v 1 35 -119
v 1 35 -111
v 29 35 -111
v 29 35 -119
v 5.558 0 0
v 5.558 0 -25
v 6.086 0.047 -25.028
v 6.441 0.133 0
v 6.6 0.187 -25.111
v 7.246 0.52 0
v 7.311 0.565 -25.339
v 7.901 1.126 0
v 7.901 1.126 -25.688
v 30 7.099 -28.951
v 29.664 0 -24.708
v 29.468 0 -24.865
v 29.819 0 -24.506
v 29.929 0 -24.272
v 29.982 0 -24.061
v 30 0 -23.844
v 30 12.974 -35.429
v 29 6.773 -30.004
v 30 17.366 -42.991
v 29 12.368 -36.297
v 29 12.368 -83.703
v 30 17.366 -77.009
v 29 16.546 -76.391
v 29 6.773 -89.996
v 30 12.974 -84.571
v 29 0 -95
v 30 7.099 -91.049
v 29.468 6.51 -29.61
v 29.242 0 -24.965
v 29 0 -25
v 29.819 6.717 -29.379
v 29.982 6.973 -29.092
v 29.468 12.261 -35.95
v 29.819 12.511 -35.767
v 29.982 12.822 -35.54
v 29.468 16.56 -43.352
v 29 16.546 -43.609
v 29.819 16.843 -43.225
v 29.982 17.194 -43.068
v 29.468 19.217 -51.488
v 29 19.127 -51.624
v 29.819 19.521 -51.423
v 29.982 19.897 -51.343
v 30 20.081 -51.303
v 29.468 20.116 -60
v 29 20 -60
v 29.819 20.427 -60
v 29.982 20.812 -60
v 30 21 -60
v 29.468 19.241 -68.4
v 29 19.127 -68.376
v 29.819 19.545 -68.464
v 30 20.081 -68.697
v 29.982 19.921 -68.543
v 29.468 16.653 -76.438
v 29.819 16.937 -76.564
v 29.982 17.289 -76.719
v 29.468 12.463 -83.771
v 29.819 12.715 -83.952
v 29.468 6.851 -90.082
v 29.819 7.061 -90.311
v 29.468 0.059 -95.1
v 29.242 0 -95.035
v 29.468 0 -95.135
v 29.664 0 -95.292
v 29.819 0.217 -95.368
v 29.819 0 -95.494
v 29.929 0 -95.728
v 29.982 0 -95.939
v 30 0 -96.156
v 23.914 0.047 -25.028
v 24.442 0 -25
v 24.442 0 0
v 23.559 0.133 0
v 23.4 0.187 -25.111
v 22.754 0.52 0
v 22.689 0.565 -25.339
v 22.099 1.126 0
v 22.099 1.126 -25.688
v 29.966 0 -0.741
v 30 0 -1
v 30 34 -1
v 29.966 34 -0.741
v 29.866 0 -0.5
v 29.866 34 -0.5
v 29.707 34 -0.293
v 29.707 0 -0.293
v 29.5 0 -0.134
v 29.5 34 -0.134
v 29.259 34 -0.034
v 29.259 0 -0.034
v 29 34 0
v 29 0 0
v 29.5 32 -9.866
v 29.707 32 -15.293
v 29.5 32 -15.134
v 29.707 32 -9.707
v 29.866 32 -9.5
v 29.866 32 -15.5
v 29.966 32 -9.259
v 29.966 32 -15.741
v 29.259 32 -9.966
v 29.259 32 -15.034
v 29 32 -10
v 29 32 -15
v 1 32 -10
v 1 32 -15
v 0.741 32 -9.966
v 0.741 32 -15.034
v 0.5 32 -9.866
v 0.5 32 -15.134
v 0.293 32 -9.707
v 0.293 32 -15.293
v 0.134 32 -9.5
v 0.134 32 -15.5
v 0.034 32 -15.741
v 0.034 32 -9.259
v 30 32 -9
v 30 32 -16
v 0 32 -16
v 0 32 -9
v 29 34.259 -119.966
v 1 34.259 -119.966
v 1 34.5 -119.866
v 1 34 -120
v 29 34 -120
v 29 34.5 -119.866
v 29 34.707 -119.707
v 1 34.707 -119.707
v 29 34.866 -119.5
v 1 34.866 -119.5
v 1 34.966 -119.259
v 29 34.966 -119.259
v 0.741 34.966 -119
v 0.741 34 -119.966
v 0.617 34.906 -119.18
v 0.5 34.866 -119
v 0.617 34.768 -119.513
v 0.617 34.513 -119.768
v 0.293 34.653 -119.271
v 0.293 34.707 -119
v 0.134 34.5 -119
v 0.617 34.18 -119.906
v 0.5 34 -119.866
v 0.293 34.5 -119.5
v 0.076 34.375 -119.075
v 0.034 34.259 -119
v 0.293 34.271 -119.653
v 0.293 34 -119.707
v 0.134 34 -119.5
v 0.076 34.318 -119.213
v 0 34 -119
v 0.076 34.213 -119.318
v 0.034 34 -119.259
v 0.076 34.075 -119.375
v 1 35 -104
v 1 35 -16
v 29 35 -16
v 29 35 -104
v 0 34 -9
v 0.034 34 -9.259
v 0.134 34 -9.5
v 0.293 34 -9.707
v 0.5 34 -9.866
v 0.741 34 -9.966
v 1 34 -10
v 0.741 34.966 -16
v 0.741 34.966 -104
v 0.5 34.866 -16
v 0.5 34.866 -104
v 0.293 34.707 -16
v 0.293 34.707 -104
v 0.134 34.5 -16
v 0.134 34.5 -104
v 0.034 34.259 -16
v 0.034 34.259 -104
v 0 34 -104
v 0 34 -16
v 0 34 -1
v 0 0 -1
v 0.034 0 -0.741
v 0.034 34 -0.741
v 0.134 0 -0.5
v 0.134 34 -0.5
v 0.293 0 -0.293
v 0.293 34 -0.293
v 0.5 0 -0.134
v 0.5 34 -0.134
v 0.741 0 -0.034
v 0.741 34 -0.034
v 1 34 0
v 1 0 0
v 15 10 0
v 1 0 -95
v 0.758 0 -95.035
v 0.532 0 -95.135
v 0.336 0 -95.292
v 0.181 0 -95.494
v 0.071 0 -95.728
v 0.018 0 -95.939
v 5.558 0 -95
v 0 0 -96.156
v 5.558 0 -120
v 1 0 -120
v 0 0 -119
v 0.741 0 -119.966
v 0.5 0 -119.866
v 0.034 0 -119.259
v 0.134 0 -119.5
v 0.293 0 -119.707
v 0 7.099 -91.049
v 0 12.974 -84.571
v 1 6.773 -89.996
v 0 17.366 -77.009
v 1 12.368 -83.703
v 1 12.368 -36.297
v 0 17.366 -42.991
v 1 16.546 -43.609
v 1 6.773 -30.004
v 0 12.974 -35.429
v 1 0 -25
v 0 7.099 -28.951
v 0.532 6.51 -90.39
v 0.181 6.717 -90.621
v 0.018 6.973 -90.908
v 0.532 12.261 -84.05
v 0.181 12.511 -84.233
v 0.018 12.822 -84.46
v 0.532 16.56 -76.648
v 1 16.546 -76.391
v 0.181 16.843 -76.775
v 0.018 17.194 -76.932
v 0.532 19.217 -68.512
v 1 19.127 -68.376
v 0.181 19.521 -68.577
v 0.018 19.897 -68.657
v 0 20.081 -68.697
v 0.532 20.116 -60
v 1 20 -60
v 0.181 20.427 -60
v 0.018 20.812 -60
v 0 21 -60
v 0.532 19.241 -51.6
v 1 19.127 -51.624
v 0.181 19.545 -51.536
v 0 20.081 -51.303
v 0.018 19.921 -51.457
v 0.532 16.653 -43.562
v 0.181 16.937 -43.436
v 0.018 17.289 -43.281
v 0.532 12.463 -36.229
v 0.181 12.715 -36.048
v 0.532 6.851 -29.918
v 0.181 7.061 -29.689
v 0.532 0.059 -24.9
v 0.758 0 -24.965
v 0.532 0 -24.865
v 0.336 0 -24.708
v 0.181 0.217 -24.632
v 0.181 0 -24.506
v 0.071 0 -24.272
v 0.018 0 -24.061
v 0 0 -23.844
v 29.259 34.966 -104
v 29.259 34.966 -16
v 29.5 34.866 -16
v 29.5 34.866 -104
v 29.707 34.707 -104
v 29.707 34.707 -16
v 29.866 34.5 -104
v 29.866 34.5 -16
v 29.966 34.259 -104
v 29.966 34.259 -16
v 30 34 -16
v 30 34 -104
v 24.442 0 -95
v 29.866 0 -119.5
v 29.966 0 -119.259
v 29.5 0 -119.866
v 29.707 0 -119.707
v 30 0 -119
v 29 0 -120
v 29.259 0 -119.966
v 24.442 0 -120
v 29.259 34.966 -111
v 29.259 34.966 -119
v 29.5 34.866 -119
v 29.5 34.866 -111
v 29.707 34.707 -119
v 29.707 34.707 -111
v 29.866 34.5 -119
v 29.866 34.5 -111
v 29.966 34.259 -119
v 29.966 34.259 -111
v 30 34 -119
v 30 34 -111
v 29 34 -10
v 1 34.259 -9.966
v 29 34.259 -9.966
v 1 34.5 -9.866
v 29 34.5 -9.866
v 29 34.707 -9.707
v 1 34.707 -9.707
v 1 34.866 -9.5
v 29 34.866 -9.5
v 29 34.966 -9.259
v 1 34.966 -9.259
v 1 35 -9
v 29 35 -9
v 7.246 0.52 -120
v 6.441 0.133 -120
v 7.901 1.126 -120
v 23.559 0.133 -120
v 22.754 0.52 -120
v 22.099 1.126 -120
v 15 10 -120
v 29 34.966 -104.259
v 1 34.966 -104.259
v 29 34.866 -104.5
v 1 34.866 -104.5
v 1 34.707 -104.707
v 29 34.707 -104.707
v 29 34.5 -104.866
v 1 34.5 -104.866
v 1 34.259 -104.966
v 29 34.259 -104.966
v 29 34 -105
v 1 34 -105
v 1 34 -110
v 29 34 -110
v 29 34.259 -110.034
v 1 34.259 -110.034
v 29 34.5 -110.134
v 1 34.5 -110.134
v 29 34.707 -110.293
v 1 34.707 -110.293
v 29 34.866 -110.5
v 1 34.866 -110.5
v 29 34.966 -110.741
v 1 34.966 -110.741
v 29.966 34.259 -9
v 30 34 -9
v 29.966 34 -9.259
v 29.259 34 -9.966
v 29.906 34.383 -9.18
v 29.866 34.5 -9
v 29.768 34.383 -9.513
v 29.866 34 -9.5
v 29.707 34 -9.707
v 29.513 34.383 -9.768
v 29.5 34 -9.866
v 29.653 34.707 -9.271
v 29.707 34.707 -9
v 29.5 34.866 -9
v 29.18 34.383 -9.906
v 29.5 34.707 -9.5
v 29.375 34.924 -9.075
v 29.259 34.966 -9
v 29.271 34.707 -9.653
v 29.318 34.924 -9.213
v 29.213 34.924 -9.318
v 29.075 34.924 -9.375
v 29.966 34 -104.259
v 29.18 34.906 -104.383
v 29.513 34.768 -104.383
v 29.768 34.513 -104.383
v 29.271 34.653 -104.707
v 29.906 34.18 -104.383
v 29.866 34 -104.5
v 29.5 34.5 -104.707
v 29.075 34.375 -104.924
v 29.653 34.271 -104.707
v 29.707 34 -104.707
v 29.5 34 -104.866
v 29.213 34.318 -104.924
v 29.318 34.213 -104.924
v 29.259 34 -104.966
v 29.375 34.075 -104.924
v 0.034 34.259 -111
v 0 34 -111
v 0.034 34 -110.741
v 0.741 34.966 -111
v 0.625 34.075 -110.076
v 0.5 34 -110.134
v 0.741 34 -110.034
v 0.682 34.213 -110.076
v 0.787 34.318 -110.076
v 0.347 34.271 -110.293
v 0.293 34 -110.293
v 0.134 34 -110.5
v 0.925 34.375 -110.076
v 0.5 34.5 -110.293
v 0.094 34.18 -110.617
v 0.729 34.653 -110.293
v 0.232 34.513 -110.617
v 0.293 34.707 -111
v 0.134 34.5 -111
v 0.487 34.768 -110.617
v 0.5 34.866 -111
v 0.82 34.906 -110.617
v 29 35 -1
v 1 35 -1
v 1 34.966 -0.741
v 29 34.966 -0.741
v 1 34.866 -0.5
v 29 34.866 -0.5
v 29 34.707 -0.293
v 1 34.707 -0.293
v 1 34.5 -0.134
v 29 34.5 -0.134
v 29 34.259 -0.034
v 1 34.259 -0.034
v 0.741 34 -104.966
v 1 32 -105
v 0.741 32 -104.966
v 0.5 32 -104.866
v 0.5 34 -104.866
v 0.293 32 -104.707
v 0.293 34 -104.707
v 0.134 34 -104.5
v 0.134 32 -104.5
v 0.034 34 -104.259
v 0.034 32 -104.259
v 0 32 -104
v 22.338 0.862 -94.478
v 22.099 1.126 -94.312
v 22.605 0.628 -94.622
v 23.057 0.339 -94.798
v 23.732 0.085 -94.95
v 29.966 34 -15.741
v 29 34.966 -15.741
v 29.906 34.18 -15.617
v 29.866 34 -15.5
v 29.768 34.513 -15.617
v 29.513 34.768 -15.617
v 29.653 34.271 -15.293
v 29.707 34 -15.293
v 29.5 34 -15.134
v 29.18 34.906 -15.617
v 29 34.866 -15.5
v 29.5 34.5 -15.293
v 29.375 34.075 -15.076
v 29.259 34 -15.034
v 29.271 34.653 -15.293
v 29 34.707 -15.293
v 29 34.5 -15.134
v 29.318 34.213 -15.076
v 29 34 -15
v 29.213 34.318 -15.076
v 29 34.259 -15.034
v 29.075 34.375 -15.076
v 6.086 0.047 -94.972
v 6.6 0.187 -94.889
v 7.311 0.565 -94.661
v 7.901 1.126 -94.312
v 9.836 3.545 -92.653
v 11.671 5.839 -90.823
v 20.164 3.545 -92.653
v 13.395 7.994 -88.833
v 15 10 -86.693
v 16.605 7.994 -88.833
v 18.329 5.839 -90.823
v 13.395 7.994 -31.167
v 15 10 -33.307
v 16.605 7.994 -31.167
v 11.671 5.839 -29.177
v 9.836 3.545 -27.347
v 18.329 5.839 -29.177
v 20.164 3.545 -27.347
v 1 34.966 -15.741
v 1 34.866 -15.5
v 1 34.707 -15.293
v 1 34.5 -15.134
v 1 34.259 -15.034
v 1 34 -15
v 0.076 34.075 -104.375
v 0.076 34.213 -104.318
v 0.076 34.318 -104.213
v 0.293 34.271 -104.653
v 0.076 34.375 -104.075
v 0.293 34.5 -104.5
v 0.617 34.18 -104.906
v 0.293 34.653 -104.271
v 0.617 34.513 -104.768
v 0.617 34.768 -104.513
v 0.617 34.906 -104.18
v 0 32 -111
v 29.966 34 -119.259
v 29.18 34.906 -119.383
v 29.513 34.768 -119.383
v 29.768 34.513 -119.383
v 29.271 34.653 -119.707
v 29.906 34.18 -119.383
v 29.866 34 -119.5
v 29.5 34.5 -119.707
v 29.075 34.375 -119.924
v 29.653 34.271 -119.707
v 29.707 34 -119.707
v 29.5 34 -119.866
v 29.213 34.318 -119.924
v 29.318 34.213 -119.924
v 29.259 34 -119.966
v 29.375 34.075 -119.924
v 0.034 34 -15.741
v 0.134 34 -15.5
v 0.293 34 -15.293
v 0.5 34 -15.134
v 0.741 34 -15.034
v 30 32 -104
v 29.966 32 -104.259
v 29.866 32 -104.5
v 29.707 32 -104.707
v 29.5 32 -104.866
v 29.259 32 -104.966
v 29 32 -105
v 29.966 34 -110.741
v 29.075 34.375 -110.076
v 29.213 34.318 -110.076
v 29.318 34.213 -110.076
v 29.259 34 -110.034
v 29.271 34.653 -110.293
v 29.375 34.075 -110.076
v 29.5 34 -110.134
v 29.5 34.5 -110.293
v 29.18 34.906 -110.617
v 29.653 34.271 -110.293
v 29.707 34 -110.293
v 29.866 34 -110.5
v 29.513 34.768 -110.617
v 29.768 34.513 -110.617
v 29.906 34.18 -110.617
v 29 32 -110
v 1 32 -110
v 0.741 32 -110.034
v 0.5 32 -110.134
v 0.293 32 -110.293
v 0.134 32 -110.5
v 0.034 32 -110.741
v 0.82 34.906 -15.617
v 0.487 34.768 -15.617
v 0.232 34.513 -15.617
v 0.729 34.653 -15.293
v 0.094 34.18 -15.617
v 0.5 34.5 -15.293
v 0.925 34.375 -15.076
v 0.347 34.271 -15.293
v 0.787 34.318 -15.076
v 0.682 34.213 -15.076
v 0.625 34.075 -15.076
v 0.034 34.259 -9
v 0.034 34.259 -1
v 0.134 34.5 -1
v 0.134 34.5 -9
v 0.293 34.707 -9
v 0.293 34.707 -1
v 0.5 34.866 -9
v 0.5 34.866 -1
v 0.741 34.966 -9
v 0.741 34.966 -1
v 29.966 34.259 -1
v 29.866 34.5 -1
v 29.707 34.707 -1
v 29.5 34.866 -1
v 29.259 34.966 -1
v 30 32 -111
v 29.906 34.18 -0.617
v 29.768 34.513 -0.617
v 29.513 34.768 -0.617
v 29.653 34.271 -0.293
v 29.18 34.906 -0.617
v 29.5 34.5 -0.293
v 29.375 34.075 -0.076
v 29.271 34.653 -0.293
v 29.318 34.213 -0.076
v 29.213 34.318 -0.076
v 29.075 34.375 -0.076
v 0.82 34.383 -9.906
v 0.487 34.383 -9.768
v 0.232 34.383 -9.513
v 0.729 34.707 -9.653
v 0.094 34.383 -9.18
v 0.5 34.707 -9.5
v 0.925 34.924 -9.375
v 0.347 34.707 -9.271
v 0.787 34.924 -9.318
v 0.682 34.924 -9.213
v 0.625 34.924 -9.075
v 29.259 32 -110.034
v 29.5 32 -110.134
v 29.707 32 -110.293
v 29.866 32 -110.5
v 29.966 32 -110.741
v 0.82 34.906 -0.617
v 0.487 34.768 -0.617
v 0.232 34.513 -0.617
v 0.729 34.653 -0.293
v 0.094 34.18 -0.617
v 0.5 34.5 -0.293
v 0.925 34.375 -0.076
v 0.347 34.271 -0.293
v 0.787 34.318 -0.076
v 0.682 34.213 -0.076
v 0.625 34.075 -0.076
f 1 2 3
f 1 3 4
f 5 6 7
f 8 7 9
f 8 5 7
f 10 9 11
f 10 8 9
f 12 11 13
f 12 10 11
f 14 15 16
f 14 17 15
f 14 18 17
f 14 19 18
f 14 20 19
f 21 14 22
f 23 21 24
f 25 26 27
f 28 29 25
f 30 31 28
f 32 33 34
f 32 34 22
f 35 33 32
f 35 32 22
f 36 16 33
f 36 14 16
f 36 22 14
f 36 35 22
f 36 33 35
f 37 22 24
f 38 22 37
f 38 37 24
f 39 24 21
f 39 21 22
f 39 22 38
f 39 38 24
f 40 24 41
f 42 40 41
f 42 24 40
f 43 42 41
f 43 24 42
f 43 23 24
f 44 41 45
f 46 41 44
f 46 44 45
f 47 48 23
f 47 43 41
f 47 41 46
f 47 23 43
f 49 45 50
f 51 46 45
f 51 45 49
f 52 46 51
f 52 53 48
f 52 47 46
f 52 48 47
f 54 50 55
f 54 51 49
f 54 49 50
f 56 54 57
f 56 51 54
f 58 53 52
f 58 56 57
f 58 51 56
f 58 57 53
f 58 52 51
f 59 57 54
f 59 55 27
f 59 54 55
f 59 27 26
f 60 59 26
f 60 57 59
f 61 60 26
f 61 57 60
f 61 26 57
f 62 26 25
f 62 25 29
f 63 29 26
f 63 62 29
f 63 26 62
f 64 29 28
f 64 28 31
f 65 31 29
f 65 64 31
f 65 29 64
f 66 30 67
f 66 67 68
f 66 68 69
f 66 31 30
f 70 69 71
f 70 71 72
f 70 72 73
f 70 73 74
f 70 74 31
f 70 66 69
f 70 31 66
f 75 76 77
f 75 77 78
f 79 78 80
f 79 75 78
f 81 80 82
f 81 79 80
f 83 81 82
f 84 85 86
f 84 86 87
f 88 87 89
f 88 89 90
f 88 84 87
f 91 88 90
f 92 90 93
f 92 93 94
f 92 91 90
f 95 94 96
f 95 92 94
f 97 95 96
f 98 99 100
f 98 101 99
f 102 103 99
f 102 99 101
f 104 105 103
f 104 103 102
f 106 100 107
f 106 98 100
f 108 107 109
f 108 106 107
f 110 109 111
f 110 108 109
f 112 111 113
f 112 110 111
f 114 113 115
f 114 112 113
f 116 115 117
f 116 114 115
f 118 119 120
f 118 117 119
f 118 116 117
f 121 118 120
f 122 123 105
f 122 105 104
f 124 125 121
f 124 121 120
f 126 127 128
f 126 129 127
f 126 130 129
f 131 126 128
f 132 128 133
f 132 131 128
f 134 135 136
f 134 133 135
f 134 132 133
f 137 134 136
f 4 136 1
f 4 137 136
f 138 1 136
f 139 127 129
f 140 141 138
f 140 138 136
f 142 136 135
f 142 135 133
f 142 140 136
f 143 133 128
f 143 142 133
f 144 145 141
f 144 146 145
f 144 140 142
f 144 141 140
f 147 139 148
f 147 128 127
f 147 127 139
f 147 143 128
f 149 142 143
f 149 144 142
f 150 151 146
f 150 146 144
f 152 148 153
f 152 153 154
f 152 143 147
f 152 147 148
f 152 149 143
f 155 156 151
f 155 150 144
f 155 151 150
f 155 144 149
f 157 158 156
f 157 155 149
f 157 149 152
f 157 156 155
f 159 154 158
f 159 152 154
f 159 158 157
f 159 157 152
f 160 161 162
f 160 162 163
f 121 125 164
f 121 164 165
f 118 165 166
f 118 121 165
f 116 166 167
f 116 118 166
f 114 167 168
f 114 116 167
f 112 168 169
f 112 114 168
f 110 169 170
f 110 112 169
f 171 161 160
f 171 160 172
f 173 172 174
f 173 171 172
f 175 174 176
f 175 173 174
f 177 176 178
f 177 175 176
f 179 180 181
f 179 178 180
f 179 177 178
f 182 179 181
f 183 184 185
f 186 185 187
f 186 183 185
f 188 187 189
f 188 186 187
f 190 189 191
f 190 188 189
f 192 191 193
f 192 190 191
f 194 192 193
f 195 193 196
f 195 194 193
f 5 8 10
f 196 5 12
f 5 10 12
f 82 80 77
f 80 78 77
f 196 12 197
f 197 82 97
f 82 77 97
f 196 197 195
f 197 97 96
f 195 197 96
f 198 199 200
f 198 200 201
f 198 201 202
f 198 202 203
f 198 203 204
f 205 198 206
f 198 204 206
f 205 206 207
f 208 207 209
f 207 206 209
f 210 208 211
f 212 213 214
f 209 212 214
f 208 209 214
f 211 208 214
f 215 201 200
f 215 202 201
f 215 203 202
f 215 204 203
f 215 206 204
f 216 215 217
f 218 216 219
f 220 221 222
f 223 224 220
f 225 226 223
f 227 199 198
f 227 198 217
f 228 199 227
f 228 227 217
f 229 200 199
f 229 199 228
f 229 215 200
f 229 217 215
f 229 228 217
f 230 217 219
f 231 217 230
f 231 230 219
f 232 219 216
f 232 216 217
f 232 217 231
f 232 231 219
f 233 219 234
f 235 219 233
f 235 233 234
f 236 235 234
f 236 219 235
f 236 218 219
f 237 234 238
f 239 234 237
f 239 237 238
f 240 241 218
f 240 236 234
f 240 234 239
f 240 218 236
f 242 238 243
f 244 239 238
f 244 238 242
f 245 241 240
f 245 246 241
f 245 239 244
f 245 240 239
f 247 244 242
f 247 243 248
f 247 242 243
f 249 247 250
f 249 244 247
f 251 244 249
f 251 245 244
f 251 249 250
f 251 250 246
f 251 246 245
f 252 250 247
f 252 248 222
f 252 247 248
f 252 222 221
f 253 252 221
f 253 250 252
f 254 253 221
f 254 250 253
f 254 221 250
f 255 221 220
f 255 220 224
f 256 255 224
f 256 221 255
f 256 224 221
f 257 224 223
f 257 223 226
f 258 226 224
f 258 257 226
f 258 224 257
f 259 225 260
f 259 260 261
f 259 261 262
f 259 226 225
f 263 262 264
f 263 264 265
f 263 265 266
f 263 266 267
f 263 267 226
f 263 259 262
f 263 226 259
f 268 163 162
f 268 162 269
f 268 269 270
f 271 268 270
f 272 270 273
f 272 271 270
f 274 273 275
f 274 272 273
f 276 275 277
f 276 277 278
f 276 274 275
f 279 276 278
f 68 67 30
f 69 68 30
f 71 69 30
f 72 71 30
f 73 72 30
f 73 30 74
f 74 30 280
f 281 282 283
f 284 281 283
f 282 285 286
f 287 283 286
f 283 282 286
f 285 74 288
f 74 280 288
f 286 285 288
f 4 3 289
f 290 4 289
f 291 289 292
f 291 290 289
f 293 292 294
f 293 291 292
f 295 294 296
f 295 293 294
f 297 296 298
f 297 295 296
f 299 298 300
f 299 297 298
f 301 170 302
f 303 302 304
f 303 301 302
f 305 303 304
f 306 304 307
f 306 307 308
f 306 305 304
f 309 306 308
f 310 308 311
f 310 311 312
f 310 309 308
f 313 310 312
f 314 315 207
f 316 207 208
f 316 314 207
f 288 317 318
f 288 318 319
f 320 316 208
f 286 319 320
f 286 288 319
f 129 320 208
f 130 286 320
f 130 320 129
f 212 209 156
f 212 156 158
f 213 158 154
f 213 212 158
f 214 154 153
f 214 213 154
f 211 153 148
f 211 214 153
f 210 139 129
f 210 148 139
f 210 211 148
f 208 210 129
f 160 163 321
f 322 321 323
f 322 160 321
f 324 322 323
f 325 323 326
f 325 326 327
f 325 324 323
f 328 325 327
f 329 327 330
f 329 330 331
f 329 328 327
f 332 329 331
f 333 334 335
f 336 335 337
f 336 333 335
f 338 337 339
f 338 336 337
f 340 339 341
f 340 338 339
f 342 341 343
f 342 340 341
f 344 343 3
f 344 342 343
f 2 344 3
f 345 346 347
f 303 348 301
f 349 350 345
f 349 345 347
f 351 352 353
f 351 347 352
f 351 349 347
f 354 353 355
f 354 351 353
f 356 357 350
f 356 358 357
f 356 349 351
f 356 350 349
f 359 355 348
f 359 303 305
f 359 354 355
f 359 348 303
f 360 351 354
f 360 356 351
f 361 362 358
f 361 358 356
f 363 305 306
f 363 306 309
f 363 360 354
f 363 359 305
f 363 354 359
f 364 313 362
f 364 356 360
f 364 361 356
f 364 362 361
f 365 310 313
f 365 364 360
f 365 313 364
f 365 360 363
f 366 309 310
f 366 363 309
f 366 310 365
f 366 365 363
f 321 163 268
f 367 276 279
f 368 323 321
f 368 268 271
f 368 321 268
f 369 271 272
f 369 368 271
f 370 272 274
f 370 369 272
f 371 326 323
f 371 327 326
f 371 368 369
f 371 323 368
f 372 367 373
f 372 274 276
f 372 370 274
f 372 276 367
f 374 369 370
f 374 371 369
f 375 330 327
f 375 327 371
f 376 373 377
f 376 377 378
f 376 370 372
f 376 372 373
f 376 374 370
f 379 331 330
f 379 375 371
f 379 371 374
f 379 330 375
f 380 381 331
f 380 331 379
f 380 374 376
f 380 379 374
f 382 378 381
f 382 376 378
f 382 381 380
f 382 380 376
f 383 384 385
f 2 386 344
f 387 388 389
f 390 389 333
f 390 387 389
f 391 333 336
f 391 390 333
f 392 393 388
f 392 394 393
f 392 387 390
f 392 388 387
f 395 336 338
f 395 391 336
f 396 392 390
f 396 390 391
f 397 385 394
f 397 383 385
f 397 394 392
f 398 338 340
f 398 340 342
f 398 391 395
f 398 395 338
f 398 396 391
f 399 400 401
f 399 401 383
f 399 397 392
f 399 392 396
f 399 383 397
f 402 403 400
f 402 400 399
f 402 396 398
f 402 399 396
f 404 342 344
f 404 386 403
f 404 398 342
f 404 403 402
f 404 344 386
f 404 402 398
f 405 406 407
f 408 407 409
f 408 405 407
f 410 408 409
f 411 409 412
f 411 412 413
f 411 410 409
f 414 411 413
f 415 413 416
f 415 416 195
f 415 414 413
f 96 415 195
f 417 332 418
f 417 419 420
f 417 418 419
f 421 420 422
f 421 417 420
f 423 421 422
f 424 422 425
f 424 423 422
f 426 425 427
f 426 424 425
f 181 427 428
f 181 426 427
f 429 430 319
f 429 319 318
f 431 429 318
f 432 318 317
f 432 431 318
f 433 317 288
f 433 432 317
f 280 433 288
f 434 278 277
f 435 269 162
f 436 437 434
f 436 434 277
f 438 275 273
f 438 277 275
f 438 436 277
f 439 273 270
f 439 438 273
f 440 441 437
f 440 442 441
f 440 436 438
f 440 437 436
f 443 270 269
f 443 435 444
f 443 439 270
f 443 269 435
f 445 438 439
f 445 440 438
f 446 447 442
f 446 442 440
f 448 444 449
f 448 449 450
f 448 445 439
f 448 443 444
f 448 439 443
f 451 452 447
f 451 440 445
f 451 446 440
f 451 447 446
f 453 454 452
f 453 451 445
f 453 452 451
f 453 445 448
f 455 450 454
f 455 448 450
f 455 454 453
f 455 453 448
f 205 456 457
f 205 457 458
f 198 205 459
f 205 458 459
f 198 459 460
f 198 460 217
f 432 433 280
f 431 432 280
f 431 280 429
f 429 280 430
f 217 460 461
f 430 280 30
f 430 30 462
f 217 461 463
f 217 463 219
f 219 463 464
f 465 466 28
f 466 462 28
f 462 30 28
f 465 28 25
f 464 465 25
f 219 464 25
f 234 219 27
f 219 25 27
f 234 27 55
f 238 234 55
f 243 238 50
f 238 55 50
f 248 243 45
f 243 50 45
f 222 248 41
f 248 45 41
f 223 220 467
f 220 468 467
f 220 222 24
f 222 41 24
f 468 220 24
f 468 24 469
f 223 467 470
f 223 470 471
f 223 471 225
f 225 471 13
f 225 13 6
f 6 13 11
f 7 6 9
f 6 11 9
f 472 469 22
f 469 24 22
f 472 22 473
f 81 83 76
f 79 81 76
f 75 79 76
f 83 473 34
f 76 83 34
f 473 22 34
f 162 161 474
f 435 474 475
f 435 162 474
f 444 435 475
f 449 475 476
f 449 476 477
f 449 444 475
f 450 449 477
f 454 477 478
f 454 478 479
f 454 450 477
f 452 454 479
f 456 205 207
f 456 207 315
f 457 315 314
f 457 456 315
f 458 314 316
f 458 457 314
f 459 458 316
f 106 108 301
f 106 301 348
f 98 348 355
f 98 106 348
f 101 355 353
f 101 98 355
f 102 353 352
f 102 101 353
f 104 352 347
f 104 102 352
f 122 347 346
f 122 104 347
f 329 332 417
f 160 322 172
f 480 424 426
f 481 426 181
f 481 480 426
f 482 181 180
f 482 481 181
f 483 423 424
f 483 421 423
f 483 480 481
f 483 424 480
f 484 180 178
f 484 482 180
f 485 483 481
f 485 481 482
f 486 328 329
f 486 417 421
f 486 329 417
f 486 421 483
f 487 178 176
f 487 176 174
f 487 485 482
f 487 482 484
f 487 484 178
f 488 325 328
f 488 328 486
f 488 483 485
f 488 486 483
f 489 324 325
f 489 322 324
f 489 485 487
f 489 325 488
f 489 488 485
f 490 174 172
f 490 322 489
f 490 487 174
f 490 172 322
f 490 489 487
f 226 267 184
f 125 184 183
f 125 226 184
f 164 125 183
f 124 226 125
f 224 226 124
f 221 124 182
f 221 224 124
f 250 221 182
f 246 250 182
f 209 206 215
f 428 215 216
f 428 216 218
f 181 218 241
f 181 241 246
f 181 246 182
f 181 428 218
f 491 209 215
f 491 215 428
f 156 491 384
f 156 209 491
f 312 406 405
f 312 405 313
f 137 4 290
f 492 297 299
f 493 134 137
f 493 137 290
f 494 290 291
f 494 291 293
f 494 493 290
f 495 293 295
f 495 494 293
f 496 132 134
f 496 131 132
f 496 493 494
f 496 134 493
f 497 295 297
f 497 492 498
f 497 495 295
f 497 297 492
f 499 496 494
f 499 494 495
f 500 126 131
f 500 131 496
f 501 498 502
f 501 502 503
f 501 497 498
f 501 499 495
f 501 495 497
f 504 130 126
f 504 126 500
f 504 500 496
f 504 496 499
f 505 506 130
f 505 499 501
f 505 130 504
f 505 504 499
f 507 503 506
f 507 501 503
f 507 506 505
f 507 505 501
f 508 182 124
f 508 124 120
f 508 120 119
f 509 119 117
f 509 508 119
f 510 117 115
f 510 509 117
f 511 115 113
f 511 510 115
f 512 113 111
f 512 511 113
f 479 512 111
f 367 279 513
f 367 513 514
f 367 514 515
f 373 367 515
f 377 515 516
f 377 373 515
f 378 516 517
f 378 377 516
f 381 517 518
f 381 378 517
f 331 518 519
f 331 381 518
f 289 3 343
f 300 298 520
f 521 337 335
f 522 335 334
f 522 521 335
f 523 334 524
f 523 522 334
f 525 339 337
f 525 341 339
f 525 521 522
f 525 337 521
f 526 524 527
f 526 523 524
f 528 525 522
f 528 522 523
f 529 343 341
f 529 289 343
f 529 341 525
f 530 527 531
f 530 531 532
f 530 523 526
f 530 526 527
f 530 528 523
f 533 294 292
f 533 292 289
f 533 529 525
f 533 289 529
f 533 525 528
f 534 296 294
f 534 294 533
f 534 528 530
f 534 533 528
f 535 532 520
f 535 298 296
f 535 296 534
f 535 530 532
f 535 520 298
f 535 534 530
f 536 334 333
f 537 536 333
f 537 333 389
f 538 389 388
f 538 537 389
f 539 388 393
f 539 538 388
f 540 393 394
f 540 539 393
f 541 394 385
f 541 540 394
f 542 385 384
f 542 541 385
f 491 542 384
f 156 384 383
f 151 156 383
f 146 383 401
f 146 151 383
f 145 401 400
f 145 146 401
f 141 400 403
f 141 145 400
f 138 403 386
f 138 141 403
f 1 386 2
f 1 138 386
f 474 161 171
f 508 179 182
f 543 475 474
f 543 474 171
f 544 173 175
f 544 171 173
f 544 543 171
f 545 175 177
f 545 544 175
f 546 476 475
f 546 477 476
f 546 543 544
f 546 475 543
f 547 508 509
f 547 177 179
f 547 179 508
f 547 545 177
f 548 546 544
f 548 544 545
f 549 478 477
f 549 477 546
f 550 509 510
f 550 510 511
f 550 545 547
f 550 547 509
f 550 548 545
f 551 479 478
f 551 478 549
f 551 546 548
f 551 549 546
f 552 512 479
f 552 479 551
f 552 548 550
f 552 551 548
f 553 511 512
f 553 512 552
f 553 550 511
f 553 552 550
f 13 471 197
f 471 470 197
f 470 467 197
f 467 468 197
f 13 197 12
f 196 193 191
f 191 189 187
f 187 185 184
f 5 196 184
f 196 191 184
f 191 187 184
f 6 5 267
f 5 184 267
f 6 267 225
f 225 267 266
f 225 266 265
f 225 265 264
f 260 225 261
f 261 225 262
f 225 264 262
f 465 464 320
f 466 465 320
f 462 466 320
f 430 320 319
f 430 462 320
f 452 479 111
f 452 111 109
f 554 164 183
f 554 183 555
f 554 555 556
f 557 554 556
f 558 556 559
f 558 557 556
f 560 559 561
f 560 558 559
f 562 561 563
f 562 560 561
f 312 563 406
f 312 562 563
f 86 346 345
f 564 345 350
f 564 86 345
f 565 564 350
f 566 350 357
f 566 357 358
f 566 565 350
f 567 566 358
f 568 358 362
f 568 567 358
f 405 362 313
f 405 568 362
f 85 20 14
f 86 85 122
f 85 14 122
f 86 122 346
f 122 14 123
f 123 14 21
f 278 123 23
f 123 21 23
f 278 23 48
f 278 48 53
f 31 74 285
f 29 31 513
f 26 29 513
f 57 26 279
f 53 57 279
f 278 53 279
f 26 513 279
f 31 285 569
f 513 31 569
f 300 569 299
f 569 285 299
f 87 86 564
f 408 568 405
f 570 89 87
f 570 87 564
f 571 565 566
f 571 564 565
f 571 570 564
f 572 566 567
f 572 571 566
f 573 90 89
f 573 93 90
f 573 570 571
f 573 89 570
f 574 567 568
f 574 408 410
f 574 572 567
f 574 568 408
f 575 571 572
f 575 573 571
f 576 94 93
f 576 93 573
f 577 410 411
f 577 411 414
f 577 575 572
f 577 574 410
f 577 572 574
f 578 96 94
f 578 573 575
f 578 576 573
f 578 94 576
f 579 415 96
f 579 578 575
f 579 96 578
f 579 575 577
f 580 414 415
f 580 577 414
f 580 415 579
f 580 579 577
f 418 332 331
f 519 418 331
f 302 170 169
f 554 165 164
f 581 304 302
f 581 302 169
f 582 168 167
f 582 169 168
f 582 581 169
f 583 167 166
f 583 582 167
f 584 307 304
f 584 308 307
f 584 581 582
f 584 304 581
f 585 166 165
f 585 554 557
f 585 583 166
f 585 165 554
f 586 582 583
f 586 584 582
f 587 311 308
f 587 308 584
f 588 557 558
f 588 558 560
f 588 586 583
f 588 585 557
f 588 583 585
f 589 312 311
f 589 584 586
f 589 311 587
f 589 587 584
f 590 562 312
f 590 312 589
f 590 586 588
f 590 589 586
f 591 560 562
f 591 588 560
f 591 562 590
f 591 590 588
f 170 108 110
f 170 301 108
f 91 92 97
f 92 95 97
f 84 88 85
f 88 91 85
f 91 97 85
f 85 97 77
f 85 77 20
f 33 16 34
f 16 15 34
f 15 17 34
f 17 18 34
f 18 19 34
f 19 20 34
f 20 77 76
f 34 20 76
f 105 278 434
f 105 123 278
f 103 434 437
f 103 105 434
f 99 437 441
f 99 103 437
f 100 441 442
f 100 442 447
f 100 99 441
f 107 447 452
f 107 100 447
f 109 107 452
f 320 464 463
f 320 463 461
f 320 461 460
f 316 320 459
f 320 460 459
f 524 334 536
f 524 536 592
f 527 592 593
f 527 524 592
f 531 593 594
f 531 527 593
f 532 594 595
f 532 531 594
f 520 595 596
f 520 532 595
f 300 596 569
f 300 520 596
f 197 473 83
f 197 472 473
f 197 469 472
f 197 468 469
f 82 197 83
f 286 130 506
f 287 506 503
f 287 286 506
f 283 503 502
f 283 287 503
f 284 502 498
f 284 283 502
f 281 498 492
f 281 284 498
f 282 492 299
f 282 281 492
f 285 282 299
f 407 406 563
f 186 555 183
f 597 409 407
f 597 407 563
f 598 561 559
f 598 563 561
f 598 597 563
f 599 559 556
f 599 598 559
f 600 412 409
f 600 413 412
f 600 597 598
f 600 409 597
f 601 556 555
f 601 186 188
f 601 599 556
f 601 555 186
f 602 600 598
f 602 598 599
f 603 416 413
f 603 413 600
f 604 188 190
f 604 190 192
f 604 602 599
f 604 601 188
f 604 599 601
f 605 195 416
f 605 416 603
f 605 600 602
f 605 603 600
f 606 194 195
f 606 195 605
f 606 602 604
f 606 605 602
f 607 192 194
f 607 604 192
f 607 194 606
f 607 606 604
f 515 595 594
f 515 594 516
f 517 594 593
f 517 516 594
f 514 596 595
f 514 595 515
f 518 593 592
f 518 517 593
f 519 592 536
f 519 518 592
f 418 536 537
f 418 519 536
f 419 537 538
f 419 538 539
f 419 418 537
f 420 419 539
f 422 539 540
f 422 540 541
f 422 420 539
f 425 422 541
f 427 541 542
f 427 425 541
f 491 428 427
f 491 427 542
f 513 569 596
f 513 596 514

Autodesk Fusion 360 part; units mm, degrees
box "BoxPrimitive1" add length 120 width 30 height 35 placed x (0, 0, -1) y (-1, 0, 0) z (0, 1, 0) at (30, 0, 0)
sketch "Sketch2" plane through (0, 0, 0) normal (0, 0, 1) x (1, 0, 0)
  line L0 (0, 35) -> (0, 0)
  line L1 (0, 0) -> (30, 0)
  line L2 (30, 0) -> (30, 35)
  line L3 (30, 35) -> (0, 35)
  line L4 (15, 0) -> (23, 0)
  line L5 (15, 0) -> (7, 0)
  line L6 (15, 0) -> (15, 10) construction
  line L7 (15, 10) -> (7, 0)
  line L8 (15, 10) -> (23, 0)
  dimension "d6" = 8
  dimension "d7" = 8
  dimension "d8" = 10
extrude "Extrude1" cut sketch "Sketch2" against normal blind 180.216 contours L1 L4 L5 L7 L8
sketch "Sketch3" plane through (30, 0, 0) normal (1, 0, 0) x (0, 0, -1)
  line L0 (0, 35) -> (0, 0)
  line L1 (0, 0) -> (120, 0)
  line L2 (120, 0) -> (120, 35)
  line L3 (120, 35) -> (0, 35)
  line L4 (0, 0) -> (25, 0)
  line L5 (120, 0) -> (95, 0)
  arc A0 (95, 0) -> (25, 0) centre (60, -20.625) ccw
  dimension "d11" = 25
  dimension "d12" = 25
extrude "Extrude2" cut sketch "Sketch3" against normal blind 49.649 contours L1 A0
sketch "Sketch4" plane through (0, 35, 0) normal (0, 1, 0) x (-1, 0, 0)
  line L0 (-30, -120) -> (0, -120)
  line L1 (0, -120) -> (0, 0)
  line L2 (0, 0) -> (-30, 0)
  line L3 (-30, 0) -> (-30, -120)
  line L4 (-30, 0) -> (-30, -10)
  line L5 (-30, -120) -> (-30, -110)
  line L6 (-30, -10) -> (0, -10)
  line L7 (0, -10) -> (0, -14)
  line L8 (0, -14) -> (-30, -14)
  line L9 (-30, -14) -> (-30, -10)
  line L10 (-30, -110) -> (0, -110)
  line L11 (0, -110) -> (0, -106)
  line L12 (0, -106) -> (-30, -106)
  line L13 (-30, -106) -> (-30, -110)
  dimension "d15" = 10
  dimension "d16" = 10
  dimension "d17" = 4
  dimension "d18" = 4
extrude "Extrude3" cut sketch "Sketch4" against normal blind 3 contours L1 L3 L6 L7 L8 L9
extrude "Extrude4" cut sketch "Sketch4" against normal blind 3 contours L1 L3 L10 L11 L12 L13
move_face "OffsetFaces1" offset -1 1 faces at (10, 33, -14)
move_face "OffsetFaces2" offset -1 1 faces at (10, 33, -106)
fillet "Fillet1" radius 1 1 edges at (30, 35, -60)
fillet "Fillet2" radius 1 3 edges at (30, 33, -105) (29.7071, 34.7071, -105) (14.5, 35, -105)
fillet "Fillet3" radius 1 1 edges at (30, 35, -115)
fillet "Fillet4" radius 1 3 edges at (30, 17, -120) (29.7071, 34.7071, -120) (14.5, 35, -120)
fillet "Fillet5" radius 1 3 edges at (0, 17, -120) (0, 34.7071, -119.7071) (0, 35, -114.5)
fillet "Fillet6" radius 1 5 edges at (0, 33, -110) (0.2929, 34.7071, -110) (15, 35, -110) (29.7071, 34.7071, -110) (30, 33, -110)
fillet "Fillet7" radius 1 3 edges at (0, 33, -105) (0, 34.7071, -104.7071) (0, 35, -59.5)
fillet "Fillet8" radius 1 5 edges at (0, 33, -15) (0.2929, 34.7071, -15) (15, 35, -15) (29.7071, 34.7071, -15) (30, 33, -15)
fillet "Fillet9" radius 1 1 edges at (30, 33.5, -10)
fillet "Fillet10" radius 1 1 edges at (0, 33.5, -10)
fillet "Fillet11" radius 1 5 edges at (30, 35, -4.5) (29.7071, 35, -9.7071) (15, 35, -10) (0.2929, 35, -9.7071) (0, 35, -4.5)
fillet "Fillet12" radius 1 5 edges at (0, 17, 0) (0.2929, 34.7071, 0) (15, 35, 0) (29.7071, 34.7071, 0) (30, 17, 0)
fillet "Fillet13" radius 1 1 edges at (30, 20, -60)
fillet "Fillet14" radius 1 1 edges at (0, 20, -60)
fillet "Fillet15" radius 3 1 edges at (23, 0, -12.5)
fillet "Fillet16" radius 3 1 edges at (7, 0, -12.5)
fillet "Fillet17" radius 3 1 edges at (23, 0, -107.5)
fillet "Fillet18" radius 3 1 edges at (7, 0, -107.5)
